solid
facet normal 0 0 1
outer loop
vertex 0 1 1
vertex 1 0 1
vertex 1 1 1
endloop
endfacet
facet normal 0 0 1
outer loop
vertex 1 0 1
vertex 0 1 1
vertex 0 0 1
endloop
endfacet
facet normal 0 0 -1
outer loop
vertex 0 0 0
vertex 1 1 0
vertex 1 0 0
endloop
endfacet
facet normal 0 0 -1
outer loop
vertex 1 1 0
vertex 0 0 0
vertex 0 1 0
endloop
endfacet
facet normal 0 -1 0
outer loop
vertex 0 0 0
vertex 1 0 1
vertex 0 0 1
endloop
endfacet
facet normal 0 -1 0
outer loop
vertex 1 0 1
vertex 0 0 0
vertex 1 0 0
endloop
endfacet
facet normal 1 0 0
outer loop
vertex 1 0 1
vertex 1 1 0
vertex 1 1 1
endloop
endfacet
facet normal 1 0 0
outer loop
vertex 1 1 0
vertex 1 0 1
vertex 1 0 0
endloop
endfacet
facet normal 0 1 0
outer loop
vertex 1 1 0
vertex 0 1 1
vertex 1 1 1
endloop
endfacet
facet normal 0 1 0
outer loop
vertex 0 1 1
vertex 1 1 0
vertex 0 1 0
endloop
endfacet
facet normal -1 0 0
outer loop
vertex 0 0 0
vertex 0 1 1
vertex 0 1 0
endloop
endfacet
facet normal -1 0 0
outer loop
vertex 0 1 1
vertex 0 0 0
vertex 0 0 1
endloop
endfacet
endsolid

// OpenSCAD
// Revision B of the Intercom box
//
// Relies on using button extenders so the PCB can be 
// attached to the backplate and multiple levels are not needed
// 

// All dimensions in mm

// nice round holes
$fs=0.01;

// kerf of the laser beam
kerf = 0.2;
skerf = kerf / 2;

// Let's have a nice picture of the PCB to we can see what's going on
pcb_w = 100;
pcb_h = 100;
pcb_t = 2;
pcb_hole_t = 2.2;
pcb_hole_z = -0.1;

pcb_mth_x = 3.7;
pcb_mth_y = 3.7;
pcb_mth_x_spacing = 92.4;
pcb_mth_y_spacing = 92.7;
pcb_mth_dia = 3.0;

pcb_btn_x_spacing = 17.15;
// position of first button (is this right?)
pcb_btn_x = 15.5;
pcb_btn_y = 6.1;

btn_body_dia = 11.5;
btn_hole_dia = 12 - skerf;
btn_body_t = 4.5;

btn_rim_dia = 13;
btn_rim_t = 1.5;

btn_base_w = 10;
btn_base_h = 10;
btn_base_t = 3;
btn_ext_w = 8;
btn_ext_h = 8;
btn_ext_t = 18;


speaker_dia = 50;
speaker_inner_dia = 22;

speaker_x = 30;
speaker_y = 68;

spi_connector_top_y = 53;
spi_connector_bottom_y = 35;
spi_connector_left_x = 55;
spi_connector_width = 5;
spi_connector_height = 8;
spi_connector_base_t = 2;
spi_connector_pin_t = 8;
spi_connector_pin_w = 0.8;

microphone_x = 91.0;
microphone_y = 63.0;
microphone_dia = 8;
microphone_t = 5;

tenth_in = 2.54;

top_panel_t = 4;
top_panel_h = 110;
top_panel_w = 110;

tongue_length = 20;
tongue_depth = 4;

box_h = btn_ext_t 
	+ 1 * top_panel_t 
	+ btn_base_t + btn_rim_t
	+ pcb_t 
	+ spi_connector_pin_t;


base_z = -spi_connector_pin_t;// - top_panel_t;

module button(x, y, z, c) {

	// the base on the PCB
	color("Black")
	translate([x-btn_base_w/2, y-btn_base_h/2, z])
	cube([btn_base_w, btn_base_h, btn_base_t]);

	// the stalk
	color("White")
	translate([x-btn_ext_w/2, y-btn_ext_h/2, z + btn_base_t])
		cube([btn_ext_w,btn_ext_h,btn_ext_t]);

	color(c) {
		// the rim at the base of the cap
		translate([x,y,z+btn_base_t+btn_ext_t])
			cylinder(r=btn_rim_dia/2, h=btn_rim_t);

		translate([x,y, z+btn_base_t+btn_ext_t+btn_rim_t])
			cylinder(r=btn_body_dia/2, h=btn_body_t);
	}

}

module button_hole(x,y) {
		translate([x,y, pcb_t+btn_base_t+btn_ext_t+btn_rim_t])
			cylinder(r=btn_hole_dia/2, h=top_panel_t+skerf);
}

module pcb() {

	color("Red")
		cube([pcb_w, pcb_h, pcb_t]);
	
	translate([speaker_x, speaker_y,  pcb_t])
		color("Black")
		cylinder(r=speaker_dia/2, h=0.01);
}

module speaker_hole() {
	translate([speaker_x, speaker_y, pcb_hole_z])
		cylinder(r=speaker_inner_dia/2, h=pcb_hole_t);
}

module mounting_hole(x, y) {
	translate([x,y,pcb_hole_z])
	cylinder(r=pcb_mth_dia/2, h=pcb_hole_t);
}

module spi_connector() {

	translate([spi_connector_left_x, spi_connector_bottom_y, -spi_connector_base_t])
	color("black")
	cube([spi_connector_width, spi_connector_height, spi_connector_base_t]);
	color("Gold") {
		// the pins
		spi_pin(spi_connector_left_x,          spi_connector_bottom_y);
		spi_pin(spi_connector_left_x+tenth_in, spi_connector_bottom_y);

		spi_pin(spi_connector_left_x,          spi_connector_bottom_y+tenth_in);
		spi_pin(spi_connector_left_x+tenth_in, spi_connector_bottom_y+tenth_in);

		spi_pin(spi_connector_left_x,          spi_connector_bottom_y+2*tenth_in);
		spi_pin(spi_connector_left_x+tenth_in, spi_connector_bottom_y+2*tenth_in);

	}
}

module spi_pin(x,y) {
	translate([x+1,y+1,-spi_connector_pin_t])
		cube([spi_connector_pin_w, spi_connector_pin_w, spi_connector_pin_t]);
}

module microphone(x,y) {
	
	color("Silver")
	translate([x,y,pcb_t])
		cylinder(r=microphone_dia/2, h=microphone_t);
	color("Black")
	translate([x,y,pcb_t+microphone_t])
		cylinder(r=microphone_dia/2 - 1, h=0.2);
}

module mounting_holes() {
		mounting_hole(pcb_mth_x,                   pcb_mth_y);
		mounting_hole(pcb_mth_x+pcb_mth_x_spacing, pcb_mth_y);
		mounting_hole(pcb_mth_x+pcb_mth_x_spacing, pcb_mth_y+pcb_mth_y_spacing);
		mounting_hole(pcb_mth_x,                   pcb_mth_y+pcb_mth_y_spacing);
}

module pcb_assembly() {

	difference() {
		pcb();
		speaker_hole();
		mounting_holes();
	}

	button(pcb_btn_x,                      pcb_btn_y, pcb_t, "Blue");
	button(pcb_btn_x + pcb_btn_x_spacing,  pcb_btn_y, pcb_t, "Red");
	button(pcb_btn_x + pcb_btn_x_spacing*2,pcb_btn_y, pcb_t, "Yellow");
	button(pcb_btn_x + pcb_btn_x_spacing*3,pcb_btn_y, pcb_t, "Green");
	button(pcb_btn_x + pcb_btn_x_spacing*4,pcb_btn_y, pcb_t, "Black");

	spi_connector();

	microphone(microphone_x, microphone_y);
}

module top_microphone_hole(vec) {
	
	translate([vec[0]+microphone_x,vec[1]+microphone_y,pcb_t+btn_base_t+btn_ext_t+btn_rim_t])
		cylinder(r=0.5, h=top_panel_t+skerf);
}

module top_speaker_hole(vec) {
	
	translate([vec[0]+speaker_x,vec[1]+speaker_y,pcb_t+btn_base_t+btn_ext_t+btn_rim_t])
		cylinder(r=0.6, h=top_panel_t+skerf);
}

function point(radius, theta) =
 [radius * cos(theta), radius * sin(theta)];

module top_microphone_holes() {
	//color("Black")
	//	top_speaker_hole(pcb_speaker_x, pcb_speaker_y);

	for(s = [ [0,1], [4,8]]) {

		for(i = [0:1:s[1]-1]) {

			color("Black")
				top_microphone_hole(point(s[0], i*360/s[1]));
		}
	}
}

module top_speaker_holes() {
	//color("Black")
	//	top_speaker_hole(pcb_speaker_x, pcb_speaker_y);

	for(s = [ [0,1], [5,8], [10, 16], [15, 24], [20, 32]]) {

		for(i = [0:1:s[1]-1]) {

			color("Black")
				top_speaker_hole(point(s[0], i*360/s[1]));
		}
	}
}

module top_bottom() {
	cube([top_panel_w, top_panel_h, 4]);
	
	translate([-tongue_depth,tongue_length,0])
		cube([tongue_depth,tongue_length,4]);
	
	translate([-tongue_depth,top_panel_h - 2*tongue_length,0])
		cube([tongue_depth,tongue_length,4]);
	
	translate([top_panel_w,tongue_length,0])
		cube([tongue_depth,tongue_length,4]);
	
	translate([top_panel_w,top_panel_h - 2*tongue_length,0])
		cube([tongue_depth,tongue_length,4]);
}

module left_right() {
	
	// basic panel
	cube();

	// add the 
	
}

module top_panel() {
	
	difference() {
		color("Pink", 0.5)
		translate([-5,-5,pcb_t+btn_base_t+btn_ext_t+btn_rim_t])
			top_bottom();

		button_hole(pcb_btn_x,                      pcb_btn_y);
		button_hole(pcb_btn_x + pcb_btn_x_spacing,  pcb_btn_y);
		button_hole(pcb_btn_x + pcb_btn_x_spacing*2,pcb_btn_y);
		button_hole(pcb_btn_x + pcb_btn_x_spacing*3,pcb_btn_y);
		button_hole(pcb_btn_x + pcb_btn_x_spacing*4,pcb_btn_y);

		top_microphone_holes();
		top_speaker_holes();
	}
}
module bottom_panel() {
	translate([-5,-5,base_z])
		top_bottom();
}
echo ("WIBBLE");
//top_panel();
//bottom_panel();
////pcb_assembly();
left_right();
